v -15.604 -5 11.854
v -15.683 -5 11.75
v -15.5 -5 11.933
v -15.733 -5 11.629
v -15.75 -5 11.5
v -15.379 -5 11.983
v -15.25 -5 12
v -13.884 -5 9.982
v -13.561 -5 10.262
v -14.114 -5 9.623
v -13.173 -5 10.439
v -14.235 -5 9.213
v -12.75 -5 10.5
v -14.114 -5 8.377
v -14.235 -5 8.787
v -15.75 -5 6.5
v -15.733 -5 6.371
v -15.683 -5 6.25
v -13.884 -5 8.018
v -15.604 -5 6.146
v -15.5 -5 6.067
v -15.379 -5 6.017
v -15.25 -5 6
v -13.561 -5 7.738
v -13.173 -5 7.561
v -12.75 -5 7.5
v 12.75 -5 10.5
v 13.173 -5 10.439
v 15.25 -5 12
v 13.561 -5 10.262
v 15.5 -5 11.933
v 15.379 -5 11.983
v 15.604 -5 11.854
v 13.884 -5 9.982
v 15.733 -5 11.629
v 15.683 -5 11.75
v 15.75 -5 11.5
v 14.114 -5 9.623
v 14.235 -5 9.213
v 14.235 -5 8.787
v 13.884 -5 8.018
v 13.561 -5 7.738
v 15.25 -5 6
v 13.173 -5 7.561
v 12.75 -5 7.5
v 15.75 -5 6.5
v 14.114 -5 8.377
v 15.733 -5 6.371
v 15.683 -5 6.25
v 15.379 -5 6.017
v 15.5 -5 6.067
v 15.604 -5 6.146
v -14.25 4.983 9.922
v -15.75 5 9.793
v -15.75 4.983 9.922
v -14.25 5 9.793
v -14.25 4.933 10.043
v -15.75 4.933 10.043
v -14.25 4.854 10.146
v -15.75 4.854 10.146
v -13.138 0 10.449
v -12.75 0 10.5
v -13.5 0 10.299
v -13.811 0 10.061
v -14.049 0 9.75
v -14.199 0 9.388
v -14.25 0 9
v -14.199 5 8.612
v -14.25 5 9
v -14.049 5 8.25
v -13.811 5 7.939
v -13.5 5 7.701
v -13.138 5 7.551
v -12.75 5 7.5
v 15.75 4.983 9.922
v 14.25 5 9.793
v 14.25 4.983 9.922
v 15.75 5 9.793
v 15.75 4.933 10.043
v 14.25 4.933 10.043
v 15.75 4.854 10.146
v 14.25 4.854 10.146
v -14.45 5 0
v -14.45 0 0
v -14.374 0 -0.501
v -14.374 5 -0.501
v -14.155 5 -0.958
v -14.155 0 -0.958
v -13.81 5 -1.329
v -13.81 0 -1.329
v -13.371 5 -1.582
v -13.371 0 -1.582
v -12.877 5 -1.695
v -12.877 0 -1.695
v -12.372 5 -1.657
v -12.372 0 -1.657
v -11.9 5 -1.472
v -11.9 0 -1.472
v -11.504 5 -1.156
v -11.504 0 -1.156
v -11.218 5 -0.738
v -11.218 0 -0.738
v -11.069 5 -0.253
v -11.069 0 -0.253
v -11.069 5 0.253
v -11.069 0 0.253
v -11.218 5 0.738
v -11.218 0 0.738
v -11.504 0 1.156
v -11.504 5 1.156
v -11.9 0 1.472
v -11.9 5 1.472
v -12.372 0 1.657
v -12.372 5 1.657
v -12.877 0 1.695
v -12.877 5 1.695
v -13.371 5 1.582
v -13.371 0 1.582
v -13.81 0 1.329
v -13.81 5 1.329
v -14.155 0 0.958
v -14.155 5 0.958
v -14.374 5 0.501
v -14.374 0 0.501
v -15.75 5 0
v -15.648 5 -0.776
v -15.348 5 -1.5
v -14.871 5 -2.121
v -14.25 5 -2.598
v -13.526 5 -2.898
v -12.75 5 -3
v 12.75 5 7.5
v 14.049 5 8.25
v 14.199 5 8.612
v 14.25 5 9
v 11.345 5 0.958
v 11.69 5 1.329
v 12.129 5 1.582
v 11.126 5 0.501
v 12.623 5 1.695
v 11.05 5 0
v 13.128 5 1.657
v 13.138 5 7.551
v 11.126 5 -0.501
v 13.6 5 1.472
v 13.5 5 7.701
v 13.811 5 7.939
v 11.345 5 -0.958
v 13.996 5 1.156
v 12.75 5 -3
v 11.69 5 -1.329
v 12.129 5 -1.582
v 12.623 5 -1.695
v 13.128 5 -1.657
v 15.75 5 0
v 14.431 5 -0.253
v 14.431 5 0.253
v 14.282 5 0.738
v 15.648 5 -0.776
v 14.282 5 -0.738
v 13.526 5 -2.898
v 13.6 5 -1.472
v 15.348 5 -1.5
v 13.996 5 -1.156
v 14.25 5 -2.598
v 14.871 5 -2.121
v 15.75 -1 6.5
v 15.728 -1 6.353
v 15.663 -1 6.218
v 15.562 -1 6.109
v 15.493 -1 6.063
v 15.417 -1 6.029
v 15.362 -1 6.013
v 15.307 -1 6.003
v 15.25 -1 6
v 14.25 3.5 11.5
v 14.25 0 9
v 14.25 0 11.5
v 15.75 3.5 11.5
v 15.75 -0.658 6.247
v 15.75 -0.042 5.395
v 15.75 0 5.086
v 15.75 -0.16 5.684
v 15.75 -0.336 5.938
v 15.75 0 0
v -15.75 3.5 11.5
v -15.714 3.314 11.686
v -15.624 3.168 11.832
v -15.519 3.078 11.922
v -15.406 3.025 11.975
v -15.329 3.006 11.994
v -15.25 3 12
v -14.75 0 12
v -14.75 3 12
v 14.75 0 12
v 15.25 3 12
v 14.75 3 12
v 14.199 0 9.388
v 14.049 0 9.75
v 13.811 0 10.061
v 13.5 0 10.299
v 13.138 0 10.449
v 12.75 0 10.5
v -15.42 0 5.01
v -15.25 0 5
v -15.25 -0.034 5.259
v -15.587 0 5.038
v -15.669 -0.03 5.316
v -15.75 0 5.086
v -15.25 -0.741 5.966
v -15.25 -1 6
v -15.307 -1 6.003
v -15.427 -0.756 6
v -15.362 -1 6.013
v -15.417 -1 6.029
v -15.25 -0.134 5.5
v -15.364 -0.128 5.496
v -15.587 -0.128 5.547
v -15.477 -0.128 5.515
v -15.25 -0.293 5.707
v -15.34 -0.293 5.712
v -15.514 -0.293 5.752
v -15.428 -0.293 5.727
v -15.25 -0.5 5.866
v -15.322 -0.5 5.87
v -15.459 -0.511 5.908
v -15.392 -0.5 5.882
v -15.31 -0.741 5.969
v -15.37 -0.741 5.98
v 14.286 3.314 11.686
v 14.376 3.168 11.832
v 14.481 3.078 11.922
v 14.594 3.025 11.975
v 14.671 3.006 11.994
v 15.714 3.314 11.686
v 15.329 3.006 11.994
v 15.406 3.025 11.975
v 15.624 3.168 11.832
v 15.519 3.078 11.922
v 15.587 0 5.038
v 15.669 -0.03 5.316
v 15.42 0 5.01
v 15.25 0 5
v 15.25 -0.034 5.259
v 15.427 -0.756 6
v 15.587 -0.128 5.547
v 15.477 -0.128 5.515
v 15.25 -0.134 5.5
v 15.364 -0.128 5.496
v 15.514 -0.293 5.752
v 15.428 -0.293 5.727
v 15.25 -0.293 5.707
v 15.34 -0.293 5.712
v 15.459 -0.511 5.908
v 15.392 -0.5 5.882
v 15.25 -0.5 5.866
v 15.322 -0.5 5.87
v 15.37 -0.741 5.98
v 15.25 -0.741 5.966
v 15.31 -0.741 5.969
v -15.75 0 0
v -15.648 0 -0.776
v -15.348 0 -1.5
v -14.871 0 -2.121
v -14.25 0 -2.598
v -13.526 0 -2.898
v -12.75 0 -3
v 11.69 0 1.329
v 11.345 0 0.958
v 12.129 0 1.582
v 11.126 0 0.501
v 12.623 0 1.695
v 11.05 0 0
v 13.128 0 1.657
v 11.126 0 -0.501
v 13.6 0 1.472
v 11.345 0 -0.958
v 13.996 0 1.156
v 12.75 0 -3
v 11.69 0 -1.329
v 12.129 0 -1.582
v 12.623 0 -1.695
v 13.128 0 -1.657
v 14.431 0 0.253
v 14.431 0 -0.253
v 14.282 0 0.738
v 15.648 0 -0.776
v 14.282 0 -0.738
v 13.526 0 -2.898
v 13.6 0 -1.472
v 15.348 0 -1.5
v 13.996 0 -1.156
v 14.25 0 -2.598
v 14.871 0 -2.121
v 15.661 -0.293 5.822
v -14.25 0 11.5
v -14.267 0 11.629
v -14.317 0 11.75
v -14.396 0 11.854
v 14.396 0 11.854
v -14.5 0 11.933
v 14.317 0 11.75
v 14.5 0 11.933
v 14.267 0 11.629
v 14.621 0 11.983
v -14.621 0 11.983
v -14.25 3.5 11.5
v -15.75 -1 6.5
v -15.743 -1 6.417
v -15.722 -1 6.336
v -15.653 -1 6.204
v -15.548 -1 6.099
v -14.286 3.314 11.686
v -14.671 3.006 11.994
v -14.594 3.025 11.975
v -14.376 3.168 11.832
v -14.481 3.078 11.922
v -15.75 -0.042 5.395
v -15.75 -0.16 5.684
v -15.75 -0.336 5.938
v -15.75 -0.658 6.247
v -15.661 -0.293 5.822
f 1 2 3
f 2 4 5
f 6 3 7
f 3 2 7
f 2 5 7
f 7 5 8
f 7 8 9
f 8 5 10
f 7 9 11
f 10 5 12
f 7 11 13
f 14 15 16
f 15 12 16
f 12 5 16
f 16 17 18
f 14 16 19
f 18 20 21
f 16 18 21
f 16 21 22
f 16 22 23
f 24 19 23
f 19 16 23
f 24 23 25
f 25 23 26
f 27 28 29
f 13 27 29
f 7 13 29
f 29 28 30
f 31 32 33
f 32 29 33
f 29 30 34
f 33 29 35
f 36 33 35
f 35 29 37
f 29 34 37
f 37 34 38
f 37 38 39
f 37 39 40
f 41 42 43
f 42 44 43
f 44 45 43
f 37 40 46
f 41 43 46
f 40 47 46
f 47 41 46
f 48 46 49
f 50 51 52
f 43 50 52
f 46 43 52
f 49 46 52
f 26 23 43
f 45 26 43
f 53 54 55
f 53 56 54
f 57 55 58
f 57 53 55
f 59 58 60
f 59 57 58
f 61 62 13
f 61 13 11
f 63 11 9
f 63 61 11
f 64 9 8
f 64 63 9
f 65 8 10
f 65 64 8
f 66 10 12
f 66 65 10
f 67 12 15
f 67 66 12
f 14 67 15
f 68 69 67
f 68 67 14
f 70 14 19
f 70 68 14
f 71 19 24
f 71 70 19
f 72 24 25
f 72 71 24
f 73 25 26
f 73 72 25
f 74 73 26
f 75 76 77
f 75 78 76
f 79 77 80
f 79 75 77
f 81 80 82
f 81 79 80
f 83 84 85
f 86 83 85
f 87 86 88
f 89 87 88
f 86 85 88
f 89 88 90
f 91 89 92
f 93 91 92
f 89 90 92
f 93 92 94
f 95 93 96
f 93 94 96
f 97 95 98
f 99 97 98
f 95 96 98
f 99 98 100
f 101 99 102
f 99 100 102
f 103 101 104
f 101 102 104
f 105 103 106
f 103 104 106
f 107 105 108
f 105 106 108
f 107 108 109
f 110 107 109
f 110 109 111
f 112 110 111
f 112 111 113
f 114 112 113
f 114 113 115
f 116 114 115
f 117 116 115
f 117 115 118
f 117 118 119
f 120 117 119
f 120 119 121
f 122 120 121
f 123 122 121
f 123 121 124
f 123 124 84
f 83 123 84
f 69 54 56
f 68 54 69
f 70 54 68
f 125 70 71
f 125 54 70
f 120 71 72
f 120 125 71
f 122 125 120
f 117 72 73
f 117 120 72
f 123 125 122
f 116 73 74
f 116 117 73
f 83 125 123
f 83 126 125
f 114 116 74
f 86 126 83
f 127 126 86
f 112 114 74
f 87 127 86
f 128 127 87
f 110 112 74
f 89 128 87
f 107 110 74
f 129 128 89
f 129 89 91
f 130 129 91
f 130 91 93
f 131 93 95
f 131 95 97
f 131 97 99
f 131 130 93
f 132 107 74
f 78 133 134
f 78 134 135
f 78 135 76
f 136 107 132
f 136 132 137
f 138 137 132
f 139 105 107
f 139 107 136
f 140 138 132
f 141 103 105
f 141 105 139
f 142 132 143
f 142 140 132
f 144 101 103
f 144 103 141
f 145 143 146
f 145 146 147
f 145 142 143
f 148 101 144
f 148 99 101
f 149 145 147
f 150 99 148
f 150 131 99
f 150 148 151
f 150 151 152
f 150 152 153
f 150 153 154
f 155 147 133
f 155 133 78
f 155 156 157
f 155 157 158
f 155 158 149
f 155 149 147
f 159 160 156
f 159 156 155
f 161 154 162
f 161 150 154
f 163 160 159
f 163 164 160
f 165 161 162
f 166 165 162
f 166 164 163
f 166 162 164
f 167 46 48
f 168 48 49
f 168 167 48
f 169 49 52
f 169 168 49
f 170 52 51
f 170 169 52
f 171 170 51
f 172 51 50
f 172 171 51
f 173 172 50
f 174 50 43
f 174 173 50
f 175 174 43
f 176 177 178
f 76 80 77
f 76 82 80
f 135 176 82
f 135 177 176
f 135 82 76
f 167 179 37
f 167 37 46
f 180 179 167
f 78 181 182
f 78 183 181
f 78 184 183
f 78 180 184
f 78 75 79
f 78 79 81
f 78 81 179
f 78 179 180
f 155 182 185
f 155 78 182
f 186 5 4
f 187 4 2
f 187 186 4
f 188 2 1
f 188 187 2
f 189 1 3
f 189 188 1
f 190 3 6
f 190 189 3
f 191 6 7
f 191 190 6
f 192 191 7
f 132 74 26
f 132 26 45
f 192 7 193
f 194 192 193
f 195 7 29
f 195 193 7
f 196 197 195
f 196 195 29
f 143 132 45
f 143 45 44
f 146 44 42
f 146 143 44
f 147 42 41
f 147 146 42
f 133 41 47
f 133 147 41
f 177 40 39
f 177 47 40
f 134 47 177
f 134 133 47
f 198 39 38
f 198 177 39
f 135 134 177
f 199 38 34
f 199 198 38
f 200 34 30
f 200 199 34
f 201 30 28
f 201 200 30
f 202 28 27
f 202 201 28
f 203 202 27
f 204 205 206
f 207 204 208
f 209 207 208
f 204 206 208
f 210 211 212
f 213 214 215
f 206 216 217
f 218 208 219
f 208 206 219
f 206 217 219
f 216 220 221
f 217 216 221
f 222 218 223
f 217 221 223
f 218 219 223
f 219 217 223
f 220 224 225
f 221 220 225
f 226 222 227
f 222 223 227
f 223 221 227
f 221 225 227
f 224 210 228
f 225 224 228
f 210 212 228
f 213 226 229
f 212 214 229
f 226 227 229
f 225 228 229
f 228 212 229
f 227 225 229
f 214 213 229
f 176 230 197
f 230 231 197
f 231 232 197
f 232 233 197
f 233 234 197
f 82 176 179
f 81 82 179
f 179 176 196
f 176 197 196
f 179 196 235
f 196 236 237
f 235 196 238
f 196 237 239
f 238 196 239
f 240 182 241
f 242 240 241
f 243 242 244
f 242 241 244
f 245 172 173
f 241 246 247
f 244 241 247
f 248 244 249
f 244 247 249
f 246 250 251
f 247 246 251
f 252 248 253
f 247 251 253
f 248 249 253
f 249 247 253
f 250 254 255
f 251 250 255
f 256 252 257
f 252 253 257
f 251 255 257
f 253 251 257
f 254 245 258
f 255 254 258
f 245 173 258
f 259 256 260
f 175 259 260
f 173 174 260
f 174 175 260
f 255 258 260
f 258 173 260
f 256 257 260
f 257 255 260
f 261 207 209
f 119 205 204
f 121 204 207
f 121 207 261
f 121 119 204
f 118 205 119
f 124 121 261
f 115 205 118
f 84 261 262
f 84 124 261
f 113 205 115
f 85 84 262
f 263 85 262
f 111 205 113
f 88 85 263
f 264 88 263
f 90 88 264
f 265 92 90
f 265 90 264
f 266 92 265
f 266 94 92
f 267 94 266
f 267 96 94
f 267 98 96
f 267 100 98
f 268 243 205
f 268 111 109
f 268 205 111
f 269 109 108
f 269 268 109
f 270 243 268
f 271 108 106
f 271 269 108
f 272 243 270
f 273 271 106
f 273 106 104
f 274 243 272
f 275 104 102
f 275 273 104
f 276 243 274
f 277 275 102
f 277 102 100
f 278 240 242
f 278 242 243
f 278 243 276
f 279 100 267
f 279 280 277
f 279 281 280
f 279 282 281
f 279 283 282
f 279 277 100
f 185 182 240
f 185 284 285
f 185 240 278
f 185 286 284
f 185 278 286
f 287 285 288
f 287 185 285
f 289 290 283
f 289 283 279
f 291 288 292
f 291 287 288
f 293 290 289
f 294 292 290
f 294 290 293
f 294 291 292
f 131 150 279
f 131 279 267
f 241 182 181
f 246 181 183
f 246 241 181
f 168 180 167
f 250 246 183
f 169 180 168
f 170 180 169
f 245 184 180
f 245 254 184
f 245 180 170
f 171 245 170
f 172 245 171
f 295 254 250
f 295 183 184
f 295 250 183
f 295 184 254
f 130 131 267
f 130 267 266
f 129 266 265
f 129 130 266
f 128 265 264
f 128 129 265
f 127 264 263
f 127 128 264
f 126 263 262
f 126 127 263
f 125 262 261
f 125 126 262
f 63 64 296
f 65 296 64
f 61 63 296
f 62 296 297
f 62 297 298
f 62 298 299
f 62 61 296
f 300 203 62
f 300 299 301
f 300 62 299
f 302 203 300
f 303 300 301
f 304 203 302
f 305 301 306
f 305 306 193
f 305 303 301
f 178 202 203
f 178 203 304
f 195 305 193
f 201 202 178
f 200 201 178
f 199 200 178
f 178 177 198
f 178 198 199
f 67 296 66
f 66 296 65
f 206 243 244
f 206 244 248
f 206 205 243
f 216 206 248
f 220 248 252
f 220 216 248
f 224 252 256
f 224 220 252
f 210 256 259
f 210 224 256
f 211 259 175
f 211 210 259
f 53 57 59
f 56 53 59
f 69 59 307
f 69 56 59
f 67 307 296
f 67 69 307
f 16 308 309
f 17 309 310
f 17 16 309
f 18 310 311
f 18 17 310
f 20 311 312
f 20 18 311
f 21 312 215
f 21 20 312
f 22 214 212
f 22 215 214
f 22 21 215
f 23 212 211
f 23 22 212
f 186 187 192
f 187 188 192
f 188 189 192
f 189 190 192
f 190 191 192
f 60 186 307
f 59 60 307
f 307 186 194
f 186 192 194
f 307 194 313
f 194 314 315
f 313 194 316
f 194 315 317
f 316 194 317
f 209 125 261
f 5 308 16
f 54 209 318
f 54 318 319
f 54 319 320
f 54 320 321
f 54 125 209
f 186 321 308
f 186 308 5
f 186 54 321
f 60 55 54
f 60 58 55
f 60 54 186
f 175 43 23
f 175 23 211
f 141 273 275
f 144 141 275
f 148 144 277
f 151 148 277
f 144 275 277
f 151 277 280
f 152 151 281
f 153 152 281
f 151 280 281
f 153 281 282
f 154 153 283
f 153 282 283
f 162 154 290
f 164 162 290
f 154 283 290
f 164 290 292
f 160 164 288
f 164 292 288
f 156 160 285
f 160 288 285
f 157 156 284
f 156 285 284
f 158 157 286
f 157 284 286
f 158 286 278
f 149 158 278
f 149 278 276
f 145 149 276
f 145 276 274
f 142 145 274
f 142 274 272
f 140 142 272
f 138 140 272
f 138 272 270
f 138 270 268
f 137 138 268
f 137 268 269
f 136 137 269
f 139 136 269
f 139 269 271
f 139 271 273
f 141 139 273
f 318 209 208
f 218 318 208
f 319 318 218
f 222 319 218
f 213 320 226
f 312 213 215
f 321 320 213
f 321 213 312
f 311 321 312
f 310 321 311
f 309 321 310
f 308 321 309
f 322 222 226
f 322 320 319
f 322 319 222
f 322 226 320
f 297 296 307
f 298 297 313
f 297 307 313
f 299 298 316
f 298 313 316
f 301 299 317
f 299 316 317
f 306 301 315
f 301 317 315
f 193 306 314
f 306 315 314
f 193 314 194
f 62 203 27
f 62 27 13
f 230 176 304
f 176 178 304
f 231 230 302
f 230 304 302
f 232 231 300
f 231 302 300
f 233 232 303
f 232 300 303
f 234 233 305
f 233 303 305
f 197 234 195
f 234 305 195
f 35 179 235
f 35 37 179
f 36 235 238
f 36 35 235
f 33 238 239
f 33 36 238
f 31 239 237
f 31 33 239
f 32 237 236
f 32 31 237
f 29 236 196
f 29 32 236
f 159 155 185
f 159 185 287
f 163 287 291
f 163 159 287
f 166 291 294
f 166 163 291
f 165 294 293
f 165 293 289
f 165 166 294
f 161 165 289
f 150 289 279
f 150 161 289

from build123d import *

# Parameters (mm, degrees)
BOSS_EXTRUDE1_DEPTH  = 5
M3_CLEARANCE_HOLE1_D = 3.4
CUT_EXTRUDE1_DEPTH   = 23.182481827
SKETCH5_W            = 9
SKETCH5_H            = 5
CUT_EXTRUDE2_DEPTH   = 35.077118423
CUT_EXTRUDE5_DEPTH   = 21.422108118
CHAMFER1_SIZE        = 2
FILLET5_R            = 0.5
FILLET6_R            = 1


with BuildPart() as part:
    # Sketch1 → Boss-Extrude1 (new, symmetric)
    with BuildSketch(Plane(origin=(0, 0, 0), x_dir=(1, 0, 0), z_dir=(0, 1, 0))):
        with BuildLine():
            Line((12.75, 3), (-12.75, 3))
            ThreePointArc((-12.75, 3), (-14.871320344, 2.121320344), (-15.75, 0))
            Line((-15.75, 0), (-15.75, -12))
            Line((-15.75, -12), (15.75, -12))
            Line((15.75, -12), (15.75, 0))
            ThreePointArc((15.75, 0), (14.871320344, 2.121320344), (12.75, 3))
        make_face()
    extrude(amount=BOSS_EXTRUDE1_DEPTH, both=True)

    # M3 Clearance Hole1 (through all)
    with Locations(Plane(origin=(0, 5, 0), x_dir=(1, 0, 0), z_dir=(0, 1, 0))):
        with Locations((-12.75, 0), (12.75, 0)):
            Hole(M3_CLEARANCE_HOLE1_D / 2)

    # Sketch4 → Cut-Extrude1 (cut, through all)
    with BuildSketch(Plane(origin=(0, 5, 0), x_dir=(1, 0, 0), z_dir=(0, 1, 0))):
        with BuildLine():
            Line((-12.75, -7.5), (12.75, -7.5))
            ThreePointArc((12.75, -7.5), (14.25, -9), (12.75, -10.5))
            Line((12.75, -10.5), (-12.75, -10.5))
            ThreePointArc((-12.75, -10.5), (-14.25, -9), (-12.75, -7.5))
        make_face()
    extrude(amount=-CUT_EXTRUDE1_DEPTH, mode=Mode.SUBTRACT)

    # Sketch5 → Cut-Extrude2 (cut, through all)
    with BuildSketch(Plane(origin=(15.75, 0, 0), x_dir=(0, 0, -1), z_dir=(1, 0, 0))):
        with Locations((-1.5, -2.5)):
            Rectangle(SKETCH5_W, SKETCH5_H)
    extrude(amount=-CUT_EXTRUDE2_DEPTH, mode=Mode.SUBTRACT)

    # Sketch6 → Cut-Extrude5 (cut, through all)
    with BuildSketch(Plane.XY.offset(9)):
        Polygon((-12.75, 5), (-14.25, 5), (-14.25, 0), (14.25, 0), (14.25, 5), (12.75, 5), align=None)
    extrude(amount=CUT_EXTRUDE5_DEPTH, mode=Mode.SUBTRACT)

    # Chamfer1
    chamfer1_edges = [part.edges().sort_by_distance(p)[0] for p in [
        (-15, 5, 12),
        (15, 5, 12),
    ]]
    chamfer(chamfer1_edges, length=CHAMFER1_SIZE)

    # Fillet5
    fillet5_edges = [part.edges().sort_by_distance(p)[0] for p in [
        (-15, 5, 10),
        (15, 5, 10),
        (15.75, -1, 12),
        (-14.25, 1.5, 12),
        (-15.75, -1, 12),
        (15.75, -2.5, 6),
        (-15.75, -2.5, 6),
        (14.25, 1.5, 12),
    ]]
    fillet(fillet5_edges, radius=FILLET5_R)

    # Fillet6
    fillet6_edges = [part.edges().sort_by_distance(p)[0] for p in [
        (0, 0, 6),
        (-15.603553391, 0, 6.146446609),
        (15.603553391, 0, 6.146446609),
    ]]
    fillet(fillet6_edges, radius=FILLET6_R)


solid = part.part
